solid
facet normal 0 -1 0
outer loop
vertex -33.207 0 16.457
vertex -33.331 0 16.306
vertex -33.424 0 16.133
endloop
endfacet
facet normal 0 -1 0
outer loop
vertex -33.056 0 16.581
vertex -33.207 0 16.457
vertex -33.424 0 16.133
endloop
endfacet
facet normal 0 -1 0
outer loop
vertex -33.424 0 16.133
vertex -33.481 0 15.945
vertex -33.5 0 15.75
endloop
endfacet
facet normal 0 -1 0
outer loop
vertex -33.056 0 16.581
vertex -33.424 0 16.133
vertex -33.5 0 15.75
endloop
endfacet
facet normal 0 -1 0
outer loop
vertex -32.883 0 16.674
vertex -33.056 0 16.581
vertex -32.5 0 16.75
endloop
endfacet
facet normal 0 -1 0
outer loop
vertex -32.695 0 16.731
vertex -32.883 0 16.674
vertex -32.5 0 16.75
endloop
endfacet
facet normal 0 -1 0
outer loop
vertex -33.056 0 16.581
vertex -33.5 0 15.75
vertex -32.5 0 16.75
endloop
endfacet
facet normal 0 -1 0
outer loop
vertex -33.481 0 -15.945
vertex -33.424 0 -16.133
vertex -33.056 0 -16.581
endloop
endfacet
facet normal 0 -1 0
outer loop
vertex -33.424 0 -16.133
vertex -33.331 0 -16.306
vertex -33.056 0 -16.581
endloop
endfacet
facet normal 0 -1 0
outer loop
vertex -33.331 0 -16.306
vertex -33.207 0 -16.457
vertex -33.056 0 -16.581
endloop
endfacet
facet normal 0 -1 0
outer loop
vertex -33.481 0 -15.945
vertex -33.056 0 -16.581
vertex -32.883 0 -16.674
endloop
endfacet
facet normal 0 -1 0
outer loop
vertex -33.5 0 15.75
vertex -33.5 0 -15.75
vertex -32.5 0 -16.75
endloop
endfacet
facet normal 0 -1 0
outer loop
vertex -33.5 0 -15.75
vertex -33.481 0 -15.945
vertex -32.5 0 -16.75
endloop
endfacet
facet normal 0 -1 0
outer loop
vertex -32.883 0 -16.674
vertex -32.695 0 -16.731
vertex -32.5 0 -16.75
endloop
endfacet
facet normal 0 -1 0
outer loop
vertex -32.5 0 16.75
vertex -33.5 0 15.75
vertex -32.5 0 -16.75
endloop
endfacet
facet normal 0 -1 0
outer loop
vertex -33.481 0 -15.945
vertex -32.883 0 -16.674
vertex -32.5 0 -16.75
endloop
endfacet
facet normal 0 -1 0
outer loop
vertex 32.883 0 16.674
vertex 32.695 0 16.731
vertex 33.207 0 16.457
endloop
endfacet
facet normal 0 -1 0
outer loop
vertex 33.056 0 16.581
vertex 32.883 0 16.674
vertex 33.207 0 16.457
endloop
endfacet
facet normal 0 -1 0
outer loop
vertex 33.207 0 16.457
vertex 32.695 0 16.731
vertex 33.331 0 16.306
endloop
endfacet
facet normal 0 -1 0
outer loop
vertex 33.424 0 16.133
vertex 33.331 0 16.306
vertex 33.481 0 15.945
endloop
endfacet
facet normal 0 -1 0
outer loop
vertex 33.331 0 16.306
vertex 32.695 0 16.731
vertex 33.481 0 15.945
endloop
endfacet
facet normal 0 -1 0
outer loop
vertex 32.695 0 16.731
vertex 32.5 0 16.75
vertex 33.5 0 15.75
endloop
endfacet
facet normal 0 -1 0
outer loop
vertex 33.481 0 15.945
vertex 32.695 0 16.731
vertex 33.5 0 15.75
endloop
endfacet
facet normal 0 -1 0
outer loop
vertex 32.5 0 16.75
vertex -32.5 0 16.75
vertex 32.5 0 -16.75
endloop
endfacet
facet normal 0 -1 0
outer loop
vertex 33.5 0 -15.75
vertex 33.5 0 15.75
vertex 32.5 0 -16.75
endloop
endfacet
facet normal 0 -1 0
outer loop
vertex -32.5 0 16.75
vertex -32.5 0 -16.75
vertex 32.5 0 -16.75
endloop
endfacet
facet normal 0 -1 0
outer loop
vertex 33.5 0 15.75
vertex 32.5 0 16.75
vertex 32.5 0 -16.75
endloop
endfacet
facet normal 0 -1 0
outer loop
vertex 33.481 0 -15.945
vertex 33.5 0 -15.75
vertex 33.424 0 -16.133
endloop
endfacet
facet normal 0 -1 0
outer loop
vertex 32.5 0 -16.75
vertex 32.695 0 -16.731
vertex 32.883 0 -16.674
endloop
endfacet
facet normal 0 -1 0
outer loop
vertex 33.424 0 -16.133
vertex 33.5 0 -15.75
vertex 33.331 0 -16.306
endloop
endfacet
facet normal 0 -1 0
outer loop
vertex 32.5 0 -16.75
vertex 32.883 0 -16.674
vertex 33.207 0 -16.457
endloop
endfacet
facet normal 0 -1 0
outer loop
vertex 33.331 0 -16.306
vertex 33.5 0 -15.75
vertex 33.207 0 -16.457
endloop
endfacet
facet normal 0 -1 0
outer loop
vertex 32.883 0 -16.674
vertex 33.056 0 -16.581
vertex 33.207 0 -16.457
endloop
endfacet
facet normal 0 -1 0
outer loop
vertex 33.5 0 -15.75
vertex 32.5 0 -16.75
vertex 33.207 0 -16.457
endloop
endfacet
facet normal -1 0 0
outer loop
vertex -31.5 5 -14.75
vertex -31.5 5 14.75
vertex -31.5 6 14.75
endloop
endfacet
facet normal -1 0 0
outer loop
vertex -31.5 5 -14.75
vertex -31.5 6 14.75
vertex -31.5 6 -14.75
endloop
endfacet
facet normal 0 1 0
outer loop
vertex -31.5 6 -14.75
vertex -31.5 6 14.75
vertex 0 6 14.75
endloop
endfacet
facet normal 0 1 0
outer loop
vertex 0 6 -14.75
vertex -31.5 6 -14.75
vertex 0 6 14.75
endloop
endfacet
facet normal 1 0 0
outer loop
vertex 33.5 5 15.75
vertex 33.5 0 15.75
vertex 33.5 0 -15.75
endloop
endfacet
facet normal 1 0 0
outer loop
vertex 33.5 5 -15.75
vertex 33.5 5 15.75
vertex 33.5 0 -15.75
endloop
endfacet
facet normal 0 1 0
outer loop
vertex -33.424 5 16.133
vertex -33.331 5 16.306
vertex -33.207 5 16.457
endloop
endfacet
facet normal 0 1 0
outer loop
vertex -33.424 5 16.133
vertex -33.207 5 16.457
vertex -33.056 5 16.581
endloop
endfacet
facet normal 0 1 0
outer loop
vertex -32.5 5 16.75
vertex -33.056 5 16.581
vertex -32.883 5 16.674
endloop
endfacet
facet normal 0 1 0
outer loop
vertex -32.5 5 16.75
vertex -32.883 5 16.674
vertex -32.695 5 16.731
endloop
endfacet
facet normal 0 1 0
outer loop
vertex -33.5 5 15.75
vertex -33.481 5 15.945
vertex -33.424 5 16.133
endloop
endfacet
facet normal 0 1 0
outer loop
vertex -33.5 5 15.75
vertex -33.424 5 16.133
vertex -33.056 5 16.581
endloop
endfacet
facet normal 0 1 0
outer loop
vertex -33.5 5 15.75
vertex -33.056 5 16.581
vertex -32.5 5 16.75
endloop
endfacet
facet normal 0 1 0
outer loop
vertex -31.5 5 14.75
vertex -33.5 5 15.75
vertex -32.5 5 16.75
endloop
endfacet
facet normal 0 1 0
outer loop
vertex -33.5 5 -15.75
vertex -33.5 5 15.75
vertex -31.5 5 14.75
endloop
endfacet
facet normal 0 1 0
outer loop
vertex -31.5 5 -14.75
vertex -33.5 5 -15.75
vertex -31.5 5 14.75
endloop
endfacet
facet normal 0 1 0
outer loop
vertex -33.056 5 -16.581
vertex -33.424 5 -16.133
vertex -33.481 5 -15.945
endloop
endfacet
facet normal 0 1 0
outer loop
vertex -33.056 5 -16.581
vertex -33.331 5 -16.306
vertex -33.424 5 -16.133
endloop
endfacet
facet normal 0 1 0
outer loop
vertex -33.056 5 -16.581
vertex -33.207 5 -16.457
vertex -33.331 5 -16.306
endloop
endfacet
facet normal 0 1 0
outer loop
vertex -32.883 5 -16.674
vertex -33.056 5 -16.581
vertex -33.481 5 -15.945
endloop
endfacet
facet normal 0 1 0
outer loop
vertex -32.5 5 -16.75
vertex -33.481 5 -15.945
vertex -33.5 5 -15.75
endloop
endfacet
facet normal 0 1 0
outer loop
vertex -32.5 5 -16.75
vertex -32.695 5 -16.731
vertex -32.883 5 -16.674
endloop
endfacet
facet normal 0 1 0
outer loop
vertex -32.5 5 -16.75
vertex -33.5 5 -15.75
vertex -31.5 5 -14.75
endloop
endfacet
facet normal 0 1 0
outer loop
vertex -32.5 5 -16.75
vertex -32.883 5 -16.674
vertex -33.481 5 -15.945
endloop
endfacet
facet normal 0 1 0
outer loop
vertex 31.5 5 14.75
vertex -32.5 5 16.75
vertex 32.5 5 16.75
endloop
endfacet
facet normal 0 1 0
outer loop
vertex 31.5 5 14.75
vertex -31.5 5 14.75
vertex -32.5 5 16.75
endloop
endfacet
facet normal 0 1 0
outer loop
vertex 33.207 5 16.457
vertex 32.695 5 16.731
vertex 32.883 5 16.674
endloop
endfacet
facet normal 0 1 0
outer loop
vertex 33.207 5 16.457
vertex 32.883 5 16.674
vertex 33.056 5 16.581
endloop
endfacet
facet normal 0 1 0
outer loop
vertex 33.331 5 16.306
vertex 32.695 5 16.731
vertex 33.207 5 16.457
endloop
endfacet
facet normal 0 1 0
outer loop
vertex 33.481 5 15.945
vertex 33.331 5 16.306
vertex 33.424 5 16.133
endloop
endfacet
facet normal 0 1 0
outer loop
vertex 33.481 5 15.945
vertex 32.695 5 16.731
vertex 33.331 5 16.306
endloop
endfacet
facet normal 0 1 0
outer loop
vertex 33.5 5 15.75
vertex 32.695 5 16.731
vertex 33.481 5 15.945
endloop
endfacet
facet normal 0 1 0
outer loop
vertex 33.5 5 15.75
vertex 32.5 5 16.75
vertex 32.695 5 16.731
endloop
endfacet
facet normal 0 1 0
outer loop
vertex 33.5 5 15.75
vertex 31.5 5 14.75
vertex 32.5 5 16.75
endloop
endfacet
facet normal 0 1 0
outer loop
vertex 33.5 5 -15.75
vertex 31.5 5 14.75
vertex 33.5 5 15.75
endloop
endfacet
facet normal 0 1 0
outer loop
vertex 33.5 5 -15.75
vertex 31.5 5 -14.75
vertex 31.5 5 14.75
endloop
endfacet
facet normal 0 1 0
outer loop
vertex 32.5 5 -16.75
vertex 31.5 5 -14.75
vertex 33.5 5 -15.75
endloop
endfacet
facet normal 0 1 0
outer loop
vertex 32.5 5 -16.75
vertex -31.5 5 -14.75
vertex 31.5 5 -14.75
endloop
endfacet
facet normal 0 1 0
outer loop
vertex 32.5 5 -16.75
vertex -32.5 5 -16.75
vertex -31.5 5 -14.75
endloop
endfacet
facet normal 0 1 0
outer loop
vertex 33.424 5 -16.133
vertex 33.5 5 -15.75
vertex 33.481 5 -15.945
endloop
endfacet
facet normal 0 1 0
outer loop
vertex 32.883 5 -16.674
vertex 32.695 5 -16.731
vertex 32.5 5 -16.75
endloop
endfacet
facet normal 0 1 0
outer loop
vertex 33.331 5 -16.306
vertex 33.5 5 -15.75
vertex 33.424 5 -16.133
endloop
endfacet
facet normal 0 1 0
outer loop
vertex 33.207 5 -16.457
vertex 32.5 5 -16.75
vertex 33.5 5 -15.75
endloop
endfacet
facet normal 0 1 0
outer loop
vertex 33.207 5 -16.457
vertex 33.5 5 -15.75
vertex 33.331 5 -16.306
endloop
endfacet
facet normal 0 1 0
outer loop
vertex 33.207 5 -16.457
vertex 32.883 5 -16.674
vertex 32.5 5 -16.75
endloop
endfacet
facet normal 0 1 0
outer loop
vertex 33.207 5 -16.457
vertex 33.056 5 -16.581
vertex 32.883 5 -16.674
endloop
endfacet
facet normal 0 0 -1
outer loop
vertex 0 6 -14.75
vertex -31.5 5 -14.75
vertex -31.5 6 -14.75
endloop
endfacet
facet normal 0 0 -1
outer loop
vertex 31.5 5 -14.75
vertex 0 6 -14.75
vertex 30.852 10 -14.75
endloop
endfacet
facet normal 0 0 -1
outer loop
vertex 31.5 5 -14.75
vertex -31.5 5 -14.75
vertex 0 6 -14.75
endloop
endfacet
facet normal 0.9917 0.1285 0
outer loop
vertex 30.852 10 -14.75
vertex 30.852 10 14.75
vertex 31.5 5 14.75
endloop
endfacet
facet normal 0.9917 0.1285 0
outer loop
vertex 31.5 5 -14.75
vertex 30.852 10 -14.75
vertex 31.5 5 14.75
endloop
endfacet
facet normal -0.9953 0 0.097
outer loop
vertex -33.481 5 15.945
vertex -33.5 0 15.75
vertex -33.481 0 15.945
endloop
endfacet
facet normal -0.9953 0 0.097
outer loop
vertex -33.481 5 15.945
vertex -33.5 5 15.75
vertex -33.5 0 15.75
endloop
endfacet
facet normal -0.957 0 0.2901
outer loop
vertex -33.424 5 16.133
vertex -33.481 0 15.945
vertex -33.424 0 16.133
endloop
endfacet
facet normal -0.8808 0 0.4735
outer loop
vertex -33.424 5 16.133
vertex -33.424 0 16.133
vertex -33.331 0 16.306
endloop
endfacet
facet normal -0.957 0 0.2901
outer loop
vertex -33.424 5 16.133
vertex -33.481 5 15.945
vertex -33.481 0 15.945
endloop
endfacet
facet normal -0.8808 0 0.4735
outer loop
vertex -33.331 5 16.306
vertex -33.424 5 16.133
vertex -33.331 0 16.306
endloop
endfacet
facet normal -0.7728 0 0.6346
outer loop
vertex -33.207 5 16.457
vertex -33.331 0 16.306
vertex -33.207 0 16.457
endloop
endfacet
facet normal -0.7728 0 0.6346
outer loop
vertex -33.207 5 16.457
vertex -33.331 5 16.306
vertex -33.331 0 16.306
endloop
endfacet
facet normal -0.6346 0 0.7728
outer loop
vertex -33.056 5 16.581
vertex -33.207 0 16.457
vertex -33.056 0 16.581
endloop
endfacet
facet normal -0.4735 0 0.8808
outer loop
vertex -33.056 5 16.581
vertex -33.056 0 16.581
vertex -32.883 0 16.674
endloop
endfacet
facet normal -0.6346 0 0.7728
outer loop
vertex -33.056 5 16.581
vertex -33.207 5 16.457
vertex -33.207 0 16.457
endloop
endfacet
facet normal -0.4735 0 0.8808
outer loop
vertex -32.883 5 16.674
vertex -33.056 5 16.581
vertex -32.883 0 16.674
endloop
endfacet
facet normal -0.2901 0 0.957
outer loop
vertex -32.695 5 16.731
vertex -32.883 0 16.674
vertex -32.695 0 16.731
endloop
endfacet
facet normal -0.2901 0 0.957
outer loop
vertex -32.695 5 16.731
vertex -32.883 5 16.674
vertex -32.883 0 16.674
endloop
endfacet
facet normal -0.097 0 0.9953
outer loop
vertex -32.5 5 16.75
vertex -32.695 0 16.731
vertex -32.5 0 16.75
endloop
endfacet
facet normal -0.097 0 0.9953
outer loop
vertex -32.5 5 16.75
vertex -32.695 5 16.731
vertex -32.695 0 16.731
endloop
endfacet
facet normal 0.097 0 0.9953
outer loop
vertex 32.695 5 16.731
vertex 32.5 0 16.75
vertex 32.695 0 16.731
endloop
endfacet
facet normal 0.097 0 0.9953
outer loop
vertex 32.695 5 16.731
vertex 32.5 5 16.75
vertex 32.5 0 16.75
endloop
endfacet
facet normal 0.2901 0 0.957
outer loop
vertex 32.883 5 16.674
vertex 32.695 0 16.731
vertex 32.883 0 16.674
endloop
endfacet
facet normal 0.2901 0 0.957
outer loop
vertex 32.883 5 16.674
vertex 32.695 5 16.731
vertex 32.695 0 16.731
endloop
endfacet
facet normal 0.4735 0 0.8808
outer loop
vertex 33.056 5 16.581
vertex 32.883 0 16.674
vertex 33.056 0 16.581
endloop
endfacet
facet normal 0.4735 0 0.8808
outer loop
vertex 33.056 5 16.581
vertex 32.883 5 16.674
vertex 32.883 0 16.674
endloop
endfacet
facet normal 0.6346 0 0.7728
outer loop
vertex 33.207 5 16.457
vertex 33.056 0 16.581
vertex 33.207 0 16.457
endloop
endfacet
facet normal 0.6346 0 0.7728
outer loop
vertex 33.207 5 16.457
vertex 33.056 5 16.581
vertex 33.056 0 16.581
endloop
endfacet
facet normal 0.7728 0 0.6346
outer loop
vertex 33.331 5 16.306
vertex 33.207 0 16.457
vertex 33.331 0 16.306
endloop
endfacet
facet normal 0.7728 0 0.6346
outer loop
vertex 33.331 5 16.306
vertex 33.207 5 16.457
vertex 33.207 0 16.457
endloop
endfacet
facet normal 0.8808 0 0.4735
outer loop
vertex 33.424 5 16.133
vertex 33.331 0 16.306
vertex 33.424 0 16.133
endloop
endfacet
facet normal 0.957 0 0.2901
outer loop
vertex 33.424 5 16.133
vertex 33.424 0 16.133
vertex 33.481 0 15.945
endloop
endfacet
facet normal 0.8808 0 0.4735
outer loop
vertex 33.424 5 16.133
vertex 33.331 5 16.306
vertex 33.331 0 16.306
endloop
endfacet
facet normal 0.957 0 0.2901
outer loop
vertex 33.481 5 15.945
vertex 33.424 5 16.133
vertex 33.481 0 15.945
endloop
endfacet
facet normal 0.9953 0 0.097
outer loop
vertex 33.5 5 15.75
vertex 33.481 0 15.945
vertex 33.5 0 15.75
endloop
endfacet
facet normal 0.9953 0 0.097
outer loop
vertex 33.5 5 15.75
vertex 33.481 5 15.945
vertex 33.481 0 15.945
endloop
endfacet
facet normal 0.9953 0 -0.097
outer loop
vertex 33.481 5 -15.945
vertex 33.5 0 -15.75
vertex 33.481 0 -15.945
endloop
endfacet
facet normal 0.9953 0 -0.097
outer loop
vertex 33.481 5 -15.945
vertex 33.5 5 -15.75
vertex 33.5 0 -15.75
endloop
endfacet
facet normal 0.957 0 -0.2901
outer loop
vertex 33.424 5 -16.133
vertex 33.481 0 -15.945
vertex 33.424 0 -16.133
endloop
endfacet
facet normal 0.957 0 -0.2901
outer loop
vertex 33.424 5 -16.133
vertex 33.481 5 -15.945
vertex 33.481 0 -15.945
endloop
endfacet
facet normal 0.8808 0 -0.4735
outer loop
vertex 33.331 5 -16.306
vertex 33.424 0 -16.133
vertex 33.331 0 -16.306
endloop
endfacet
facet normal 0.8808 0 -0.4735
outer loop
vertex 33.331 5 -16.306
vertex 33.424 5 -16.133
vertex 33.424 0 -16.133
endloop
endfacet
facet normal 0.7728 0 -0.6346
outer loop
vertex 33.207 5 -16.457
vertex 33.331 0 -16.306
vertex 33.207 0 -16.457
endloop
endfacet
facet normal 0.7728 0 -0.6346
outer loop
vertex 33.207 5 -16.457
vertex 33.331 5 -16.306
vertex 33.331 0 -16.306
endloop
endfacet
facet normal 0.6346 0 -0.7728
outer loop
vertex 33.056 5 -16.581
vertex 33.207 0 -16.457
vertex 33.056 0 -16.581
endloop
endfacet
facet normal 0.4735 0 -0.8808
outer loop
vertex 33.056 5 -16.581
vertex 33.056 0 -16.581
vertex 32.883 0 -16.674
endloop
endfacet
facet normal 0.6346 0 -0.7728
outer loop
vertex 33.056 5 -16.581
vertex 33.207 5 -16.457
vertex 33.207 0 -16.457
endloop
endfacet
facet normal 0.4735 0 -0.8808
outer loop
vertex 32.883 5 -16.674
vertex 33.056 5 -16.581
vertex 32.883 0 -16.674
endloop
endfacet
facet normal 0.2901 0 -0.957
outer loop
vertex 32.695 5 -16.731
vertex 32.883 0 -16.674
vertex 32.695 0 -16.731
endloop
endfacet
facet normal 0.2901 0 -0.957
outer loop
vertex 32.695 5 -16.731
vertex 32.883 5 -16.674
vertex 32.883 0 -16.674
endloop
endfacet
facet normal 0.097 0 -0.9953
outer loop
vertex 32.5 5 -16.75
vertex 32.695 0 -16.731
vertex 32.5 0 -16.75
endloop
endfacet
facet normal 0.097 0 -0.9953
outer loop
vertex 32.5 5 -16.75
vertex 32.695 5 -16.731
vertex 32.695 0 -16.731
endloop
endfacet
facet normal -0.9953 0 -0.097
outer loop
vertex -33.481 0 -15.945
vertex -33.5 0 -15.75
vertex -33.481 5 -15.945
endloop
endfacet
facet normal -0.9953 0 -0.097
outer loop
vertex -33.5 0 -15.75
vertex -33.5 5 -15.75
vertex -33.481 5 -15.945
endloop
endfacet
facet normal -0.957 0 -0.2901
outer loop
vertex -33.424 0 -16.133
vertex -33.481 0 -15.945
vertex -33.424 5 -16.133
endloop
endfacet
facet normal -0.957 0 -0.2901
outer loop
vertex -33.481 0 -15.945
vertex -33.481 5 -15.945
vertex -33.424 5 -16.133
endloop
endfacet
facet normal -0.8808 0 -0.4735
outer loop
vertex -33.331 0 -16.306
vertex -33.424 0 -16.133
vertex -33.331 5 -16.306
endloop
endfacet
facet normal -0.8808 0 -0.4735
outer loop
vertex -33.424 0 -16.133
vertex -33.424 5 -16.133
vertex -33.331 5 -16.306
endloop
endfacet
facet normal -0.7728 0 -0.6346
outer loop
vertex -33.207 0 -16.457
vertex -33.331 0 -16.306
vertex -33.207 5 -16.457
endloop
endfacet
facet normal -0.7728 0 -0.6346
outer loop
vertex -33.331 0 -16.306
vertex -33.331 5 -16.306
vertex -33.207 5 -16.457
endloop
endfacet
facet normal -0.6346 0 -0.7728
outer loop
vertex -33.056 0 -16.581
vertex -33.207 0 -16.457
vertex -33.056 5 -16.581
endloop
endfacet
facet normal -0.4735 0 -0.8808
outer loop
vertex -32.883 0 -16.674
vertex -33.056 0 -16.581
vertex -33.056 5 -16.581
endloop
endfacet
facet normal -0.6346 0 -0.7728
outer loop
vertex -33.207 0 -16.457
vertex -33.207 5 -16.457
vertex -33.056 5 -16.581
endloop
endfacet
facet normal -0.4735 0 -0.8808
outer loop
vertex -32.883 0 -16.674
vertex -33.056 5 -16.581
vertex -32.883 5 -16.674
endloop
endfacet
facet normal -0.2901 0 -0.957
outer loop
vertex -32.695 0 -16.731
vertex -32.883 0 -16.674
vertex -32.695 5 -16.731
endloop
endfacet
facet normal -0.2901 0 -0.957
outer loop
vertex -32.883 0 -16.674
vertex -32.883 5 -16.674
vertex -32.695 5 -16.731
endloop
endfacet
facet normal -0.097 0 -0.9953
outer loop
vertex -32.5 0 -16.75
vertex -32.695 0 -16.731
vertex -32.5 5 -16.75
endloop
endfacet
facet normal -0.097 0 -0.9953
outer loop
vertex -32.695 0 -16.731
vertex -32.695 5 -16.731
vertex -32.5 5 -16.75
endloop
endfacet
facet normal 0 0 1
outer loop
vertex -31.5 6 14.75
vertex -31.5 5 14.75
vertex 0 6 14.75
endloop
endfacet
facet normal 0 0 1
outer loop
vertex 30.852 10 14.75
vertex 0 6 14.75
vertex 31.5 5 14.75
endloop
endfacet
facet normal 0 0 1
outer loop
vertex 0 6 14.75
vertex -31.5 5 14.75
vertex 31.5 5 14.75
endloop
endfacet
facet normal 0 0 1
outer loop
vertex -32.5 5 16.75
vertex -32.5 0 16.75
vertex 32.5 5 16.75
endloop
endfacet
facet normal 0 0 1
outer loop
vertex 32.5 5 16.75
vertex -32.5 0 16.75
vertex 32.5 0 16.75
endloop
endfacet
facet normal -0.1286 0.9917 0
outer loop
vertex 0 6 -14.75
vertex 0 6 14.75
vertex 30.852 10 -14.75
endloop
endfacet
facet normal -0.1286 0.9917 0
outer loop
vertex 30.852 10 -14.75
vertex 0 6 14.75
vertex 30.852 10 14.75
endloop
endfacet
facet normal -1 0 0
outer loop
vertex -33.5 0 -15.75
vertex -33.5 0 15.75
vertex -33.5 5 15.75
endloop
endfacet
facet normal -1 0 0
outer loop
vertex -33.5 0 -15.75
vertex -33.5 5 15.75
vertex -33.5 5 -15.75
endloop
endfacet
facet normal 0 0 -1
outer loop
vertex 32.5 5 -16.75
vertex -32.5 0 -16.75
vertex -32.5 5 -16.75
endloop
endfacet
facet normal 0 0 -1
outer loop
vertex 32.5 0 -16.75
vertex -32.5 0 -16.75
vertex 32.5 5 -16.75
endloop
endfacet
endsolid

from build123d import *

# Parameters (mm, degrees)
SKETCH1_W               = 67
SKETCH1_H               = 33.5
BOSS_EXTRUDE1_DEPTH     = 5
FILLET1_R               = 1
SKETCH2_W               = 63
SKETCH2_H               = 29.5
BOSS_EXTRUDE2_DEPTH     = 5
CUT_EXTRUDE1_DEPTH      = 3
CUT_EXTRUDE1_DEPTH_BACK = 32.5


with BuildPart() as part:
    # Sketch1 → Boss-Extrude1 (new body)
    with BuildSketch(Plane(origin=(0, 0, 0), x_dir=(1, 0, 0), z_dir=(0, 1, 0))):
        Rectangle(SKETCH1_W, SKETCH1_H)
    extrude(amount=BOSS_EXTRUDE1_DEPTH)

    # Fillet1
    fillet1_edges = [part.edges().sort_by_distance(p)[0] for p in [
        (33.5, 2.5, 16.75),
        (-33.5, 2.5, 16.75),
        (-33.5, 2.5, -16.75),
        (33.5, 2.5, -16.75),
    ]]
    fillet(fillet1_edges, radius=FILLET1_R)

    # Sketch2 → Boss-Extrude2 (add)
    with BuildSketch(Plane(origin=(0, 5, 0), x_dir=(1, 0, 0), z_dir=(0, 1, 0))):
        Rectangle(SKETCH2_W, SKETCH2_H)
    extrude(amount=BOSS_EXTRUDE2_DEPTH)

    # Sketch3 → Cut-Extrude1 (cut, two sides)
    with BuildSketch(Plane.XY.offset(14.75)) as cut_extrude1_sk:
        Polygon((-31.5, 6), (0, 6), (30.851738311, 10), (-31.5, 10), align=None)
        Polygon((31.5, 10), (30.851738311, 10), (31.5, 5), align=None)
    extrude(amount=CUT_EXTRUDE1_DEPTH, mode=Mode.SUBTRACT)
    extrude(cut_extrude1_sk.sketch, amount=-CUT_EXTRUDE1_DEPTH_BACK, mode=Mode.SUBTRACT)


solid = part.part
